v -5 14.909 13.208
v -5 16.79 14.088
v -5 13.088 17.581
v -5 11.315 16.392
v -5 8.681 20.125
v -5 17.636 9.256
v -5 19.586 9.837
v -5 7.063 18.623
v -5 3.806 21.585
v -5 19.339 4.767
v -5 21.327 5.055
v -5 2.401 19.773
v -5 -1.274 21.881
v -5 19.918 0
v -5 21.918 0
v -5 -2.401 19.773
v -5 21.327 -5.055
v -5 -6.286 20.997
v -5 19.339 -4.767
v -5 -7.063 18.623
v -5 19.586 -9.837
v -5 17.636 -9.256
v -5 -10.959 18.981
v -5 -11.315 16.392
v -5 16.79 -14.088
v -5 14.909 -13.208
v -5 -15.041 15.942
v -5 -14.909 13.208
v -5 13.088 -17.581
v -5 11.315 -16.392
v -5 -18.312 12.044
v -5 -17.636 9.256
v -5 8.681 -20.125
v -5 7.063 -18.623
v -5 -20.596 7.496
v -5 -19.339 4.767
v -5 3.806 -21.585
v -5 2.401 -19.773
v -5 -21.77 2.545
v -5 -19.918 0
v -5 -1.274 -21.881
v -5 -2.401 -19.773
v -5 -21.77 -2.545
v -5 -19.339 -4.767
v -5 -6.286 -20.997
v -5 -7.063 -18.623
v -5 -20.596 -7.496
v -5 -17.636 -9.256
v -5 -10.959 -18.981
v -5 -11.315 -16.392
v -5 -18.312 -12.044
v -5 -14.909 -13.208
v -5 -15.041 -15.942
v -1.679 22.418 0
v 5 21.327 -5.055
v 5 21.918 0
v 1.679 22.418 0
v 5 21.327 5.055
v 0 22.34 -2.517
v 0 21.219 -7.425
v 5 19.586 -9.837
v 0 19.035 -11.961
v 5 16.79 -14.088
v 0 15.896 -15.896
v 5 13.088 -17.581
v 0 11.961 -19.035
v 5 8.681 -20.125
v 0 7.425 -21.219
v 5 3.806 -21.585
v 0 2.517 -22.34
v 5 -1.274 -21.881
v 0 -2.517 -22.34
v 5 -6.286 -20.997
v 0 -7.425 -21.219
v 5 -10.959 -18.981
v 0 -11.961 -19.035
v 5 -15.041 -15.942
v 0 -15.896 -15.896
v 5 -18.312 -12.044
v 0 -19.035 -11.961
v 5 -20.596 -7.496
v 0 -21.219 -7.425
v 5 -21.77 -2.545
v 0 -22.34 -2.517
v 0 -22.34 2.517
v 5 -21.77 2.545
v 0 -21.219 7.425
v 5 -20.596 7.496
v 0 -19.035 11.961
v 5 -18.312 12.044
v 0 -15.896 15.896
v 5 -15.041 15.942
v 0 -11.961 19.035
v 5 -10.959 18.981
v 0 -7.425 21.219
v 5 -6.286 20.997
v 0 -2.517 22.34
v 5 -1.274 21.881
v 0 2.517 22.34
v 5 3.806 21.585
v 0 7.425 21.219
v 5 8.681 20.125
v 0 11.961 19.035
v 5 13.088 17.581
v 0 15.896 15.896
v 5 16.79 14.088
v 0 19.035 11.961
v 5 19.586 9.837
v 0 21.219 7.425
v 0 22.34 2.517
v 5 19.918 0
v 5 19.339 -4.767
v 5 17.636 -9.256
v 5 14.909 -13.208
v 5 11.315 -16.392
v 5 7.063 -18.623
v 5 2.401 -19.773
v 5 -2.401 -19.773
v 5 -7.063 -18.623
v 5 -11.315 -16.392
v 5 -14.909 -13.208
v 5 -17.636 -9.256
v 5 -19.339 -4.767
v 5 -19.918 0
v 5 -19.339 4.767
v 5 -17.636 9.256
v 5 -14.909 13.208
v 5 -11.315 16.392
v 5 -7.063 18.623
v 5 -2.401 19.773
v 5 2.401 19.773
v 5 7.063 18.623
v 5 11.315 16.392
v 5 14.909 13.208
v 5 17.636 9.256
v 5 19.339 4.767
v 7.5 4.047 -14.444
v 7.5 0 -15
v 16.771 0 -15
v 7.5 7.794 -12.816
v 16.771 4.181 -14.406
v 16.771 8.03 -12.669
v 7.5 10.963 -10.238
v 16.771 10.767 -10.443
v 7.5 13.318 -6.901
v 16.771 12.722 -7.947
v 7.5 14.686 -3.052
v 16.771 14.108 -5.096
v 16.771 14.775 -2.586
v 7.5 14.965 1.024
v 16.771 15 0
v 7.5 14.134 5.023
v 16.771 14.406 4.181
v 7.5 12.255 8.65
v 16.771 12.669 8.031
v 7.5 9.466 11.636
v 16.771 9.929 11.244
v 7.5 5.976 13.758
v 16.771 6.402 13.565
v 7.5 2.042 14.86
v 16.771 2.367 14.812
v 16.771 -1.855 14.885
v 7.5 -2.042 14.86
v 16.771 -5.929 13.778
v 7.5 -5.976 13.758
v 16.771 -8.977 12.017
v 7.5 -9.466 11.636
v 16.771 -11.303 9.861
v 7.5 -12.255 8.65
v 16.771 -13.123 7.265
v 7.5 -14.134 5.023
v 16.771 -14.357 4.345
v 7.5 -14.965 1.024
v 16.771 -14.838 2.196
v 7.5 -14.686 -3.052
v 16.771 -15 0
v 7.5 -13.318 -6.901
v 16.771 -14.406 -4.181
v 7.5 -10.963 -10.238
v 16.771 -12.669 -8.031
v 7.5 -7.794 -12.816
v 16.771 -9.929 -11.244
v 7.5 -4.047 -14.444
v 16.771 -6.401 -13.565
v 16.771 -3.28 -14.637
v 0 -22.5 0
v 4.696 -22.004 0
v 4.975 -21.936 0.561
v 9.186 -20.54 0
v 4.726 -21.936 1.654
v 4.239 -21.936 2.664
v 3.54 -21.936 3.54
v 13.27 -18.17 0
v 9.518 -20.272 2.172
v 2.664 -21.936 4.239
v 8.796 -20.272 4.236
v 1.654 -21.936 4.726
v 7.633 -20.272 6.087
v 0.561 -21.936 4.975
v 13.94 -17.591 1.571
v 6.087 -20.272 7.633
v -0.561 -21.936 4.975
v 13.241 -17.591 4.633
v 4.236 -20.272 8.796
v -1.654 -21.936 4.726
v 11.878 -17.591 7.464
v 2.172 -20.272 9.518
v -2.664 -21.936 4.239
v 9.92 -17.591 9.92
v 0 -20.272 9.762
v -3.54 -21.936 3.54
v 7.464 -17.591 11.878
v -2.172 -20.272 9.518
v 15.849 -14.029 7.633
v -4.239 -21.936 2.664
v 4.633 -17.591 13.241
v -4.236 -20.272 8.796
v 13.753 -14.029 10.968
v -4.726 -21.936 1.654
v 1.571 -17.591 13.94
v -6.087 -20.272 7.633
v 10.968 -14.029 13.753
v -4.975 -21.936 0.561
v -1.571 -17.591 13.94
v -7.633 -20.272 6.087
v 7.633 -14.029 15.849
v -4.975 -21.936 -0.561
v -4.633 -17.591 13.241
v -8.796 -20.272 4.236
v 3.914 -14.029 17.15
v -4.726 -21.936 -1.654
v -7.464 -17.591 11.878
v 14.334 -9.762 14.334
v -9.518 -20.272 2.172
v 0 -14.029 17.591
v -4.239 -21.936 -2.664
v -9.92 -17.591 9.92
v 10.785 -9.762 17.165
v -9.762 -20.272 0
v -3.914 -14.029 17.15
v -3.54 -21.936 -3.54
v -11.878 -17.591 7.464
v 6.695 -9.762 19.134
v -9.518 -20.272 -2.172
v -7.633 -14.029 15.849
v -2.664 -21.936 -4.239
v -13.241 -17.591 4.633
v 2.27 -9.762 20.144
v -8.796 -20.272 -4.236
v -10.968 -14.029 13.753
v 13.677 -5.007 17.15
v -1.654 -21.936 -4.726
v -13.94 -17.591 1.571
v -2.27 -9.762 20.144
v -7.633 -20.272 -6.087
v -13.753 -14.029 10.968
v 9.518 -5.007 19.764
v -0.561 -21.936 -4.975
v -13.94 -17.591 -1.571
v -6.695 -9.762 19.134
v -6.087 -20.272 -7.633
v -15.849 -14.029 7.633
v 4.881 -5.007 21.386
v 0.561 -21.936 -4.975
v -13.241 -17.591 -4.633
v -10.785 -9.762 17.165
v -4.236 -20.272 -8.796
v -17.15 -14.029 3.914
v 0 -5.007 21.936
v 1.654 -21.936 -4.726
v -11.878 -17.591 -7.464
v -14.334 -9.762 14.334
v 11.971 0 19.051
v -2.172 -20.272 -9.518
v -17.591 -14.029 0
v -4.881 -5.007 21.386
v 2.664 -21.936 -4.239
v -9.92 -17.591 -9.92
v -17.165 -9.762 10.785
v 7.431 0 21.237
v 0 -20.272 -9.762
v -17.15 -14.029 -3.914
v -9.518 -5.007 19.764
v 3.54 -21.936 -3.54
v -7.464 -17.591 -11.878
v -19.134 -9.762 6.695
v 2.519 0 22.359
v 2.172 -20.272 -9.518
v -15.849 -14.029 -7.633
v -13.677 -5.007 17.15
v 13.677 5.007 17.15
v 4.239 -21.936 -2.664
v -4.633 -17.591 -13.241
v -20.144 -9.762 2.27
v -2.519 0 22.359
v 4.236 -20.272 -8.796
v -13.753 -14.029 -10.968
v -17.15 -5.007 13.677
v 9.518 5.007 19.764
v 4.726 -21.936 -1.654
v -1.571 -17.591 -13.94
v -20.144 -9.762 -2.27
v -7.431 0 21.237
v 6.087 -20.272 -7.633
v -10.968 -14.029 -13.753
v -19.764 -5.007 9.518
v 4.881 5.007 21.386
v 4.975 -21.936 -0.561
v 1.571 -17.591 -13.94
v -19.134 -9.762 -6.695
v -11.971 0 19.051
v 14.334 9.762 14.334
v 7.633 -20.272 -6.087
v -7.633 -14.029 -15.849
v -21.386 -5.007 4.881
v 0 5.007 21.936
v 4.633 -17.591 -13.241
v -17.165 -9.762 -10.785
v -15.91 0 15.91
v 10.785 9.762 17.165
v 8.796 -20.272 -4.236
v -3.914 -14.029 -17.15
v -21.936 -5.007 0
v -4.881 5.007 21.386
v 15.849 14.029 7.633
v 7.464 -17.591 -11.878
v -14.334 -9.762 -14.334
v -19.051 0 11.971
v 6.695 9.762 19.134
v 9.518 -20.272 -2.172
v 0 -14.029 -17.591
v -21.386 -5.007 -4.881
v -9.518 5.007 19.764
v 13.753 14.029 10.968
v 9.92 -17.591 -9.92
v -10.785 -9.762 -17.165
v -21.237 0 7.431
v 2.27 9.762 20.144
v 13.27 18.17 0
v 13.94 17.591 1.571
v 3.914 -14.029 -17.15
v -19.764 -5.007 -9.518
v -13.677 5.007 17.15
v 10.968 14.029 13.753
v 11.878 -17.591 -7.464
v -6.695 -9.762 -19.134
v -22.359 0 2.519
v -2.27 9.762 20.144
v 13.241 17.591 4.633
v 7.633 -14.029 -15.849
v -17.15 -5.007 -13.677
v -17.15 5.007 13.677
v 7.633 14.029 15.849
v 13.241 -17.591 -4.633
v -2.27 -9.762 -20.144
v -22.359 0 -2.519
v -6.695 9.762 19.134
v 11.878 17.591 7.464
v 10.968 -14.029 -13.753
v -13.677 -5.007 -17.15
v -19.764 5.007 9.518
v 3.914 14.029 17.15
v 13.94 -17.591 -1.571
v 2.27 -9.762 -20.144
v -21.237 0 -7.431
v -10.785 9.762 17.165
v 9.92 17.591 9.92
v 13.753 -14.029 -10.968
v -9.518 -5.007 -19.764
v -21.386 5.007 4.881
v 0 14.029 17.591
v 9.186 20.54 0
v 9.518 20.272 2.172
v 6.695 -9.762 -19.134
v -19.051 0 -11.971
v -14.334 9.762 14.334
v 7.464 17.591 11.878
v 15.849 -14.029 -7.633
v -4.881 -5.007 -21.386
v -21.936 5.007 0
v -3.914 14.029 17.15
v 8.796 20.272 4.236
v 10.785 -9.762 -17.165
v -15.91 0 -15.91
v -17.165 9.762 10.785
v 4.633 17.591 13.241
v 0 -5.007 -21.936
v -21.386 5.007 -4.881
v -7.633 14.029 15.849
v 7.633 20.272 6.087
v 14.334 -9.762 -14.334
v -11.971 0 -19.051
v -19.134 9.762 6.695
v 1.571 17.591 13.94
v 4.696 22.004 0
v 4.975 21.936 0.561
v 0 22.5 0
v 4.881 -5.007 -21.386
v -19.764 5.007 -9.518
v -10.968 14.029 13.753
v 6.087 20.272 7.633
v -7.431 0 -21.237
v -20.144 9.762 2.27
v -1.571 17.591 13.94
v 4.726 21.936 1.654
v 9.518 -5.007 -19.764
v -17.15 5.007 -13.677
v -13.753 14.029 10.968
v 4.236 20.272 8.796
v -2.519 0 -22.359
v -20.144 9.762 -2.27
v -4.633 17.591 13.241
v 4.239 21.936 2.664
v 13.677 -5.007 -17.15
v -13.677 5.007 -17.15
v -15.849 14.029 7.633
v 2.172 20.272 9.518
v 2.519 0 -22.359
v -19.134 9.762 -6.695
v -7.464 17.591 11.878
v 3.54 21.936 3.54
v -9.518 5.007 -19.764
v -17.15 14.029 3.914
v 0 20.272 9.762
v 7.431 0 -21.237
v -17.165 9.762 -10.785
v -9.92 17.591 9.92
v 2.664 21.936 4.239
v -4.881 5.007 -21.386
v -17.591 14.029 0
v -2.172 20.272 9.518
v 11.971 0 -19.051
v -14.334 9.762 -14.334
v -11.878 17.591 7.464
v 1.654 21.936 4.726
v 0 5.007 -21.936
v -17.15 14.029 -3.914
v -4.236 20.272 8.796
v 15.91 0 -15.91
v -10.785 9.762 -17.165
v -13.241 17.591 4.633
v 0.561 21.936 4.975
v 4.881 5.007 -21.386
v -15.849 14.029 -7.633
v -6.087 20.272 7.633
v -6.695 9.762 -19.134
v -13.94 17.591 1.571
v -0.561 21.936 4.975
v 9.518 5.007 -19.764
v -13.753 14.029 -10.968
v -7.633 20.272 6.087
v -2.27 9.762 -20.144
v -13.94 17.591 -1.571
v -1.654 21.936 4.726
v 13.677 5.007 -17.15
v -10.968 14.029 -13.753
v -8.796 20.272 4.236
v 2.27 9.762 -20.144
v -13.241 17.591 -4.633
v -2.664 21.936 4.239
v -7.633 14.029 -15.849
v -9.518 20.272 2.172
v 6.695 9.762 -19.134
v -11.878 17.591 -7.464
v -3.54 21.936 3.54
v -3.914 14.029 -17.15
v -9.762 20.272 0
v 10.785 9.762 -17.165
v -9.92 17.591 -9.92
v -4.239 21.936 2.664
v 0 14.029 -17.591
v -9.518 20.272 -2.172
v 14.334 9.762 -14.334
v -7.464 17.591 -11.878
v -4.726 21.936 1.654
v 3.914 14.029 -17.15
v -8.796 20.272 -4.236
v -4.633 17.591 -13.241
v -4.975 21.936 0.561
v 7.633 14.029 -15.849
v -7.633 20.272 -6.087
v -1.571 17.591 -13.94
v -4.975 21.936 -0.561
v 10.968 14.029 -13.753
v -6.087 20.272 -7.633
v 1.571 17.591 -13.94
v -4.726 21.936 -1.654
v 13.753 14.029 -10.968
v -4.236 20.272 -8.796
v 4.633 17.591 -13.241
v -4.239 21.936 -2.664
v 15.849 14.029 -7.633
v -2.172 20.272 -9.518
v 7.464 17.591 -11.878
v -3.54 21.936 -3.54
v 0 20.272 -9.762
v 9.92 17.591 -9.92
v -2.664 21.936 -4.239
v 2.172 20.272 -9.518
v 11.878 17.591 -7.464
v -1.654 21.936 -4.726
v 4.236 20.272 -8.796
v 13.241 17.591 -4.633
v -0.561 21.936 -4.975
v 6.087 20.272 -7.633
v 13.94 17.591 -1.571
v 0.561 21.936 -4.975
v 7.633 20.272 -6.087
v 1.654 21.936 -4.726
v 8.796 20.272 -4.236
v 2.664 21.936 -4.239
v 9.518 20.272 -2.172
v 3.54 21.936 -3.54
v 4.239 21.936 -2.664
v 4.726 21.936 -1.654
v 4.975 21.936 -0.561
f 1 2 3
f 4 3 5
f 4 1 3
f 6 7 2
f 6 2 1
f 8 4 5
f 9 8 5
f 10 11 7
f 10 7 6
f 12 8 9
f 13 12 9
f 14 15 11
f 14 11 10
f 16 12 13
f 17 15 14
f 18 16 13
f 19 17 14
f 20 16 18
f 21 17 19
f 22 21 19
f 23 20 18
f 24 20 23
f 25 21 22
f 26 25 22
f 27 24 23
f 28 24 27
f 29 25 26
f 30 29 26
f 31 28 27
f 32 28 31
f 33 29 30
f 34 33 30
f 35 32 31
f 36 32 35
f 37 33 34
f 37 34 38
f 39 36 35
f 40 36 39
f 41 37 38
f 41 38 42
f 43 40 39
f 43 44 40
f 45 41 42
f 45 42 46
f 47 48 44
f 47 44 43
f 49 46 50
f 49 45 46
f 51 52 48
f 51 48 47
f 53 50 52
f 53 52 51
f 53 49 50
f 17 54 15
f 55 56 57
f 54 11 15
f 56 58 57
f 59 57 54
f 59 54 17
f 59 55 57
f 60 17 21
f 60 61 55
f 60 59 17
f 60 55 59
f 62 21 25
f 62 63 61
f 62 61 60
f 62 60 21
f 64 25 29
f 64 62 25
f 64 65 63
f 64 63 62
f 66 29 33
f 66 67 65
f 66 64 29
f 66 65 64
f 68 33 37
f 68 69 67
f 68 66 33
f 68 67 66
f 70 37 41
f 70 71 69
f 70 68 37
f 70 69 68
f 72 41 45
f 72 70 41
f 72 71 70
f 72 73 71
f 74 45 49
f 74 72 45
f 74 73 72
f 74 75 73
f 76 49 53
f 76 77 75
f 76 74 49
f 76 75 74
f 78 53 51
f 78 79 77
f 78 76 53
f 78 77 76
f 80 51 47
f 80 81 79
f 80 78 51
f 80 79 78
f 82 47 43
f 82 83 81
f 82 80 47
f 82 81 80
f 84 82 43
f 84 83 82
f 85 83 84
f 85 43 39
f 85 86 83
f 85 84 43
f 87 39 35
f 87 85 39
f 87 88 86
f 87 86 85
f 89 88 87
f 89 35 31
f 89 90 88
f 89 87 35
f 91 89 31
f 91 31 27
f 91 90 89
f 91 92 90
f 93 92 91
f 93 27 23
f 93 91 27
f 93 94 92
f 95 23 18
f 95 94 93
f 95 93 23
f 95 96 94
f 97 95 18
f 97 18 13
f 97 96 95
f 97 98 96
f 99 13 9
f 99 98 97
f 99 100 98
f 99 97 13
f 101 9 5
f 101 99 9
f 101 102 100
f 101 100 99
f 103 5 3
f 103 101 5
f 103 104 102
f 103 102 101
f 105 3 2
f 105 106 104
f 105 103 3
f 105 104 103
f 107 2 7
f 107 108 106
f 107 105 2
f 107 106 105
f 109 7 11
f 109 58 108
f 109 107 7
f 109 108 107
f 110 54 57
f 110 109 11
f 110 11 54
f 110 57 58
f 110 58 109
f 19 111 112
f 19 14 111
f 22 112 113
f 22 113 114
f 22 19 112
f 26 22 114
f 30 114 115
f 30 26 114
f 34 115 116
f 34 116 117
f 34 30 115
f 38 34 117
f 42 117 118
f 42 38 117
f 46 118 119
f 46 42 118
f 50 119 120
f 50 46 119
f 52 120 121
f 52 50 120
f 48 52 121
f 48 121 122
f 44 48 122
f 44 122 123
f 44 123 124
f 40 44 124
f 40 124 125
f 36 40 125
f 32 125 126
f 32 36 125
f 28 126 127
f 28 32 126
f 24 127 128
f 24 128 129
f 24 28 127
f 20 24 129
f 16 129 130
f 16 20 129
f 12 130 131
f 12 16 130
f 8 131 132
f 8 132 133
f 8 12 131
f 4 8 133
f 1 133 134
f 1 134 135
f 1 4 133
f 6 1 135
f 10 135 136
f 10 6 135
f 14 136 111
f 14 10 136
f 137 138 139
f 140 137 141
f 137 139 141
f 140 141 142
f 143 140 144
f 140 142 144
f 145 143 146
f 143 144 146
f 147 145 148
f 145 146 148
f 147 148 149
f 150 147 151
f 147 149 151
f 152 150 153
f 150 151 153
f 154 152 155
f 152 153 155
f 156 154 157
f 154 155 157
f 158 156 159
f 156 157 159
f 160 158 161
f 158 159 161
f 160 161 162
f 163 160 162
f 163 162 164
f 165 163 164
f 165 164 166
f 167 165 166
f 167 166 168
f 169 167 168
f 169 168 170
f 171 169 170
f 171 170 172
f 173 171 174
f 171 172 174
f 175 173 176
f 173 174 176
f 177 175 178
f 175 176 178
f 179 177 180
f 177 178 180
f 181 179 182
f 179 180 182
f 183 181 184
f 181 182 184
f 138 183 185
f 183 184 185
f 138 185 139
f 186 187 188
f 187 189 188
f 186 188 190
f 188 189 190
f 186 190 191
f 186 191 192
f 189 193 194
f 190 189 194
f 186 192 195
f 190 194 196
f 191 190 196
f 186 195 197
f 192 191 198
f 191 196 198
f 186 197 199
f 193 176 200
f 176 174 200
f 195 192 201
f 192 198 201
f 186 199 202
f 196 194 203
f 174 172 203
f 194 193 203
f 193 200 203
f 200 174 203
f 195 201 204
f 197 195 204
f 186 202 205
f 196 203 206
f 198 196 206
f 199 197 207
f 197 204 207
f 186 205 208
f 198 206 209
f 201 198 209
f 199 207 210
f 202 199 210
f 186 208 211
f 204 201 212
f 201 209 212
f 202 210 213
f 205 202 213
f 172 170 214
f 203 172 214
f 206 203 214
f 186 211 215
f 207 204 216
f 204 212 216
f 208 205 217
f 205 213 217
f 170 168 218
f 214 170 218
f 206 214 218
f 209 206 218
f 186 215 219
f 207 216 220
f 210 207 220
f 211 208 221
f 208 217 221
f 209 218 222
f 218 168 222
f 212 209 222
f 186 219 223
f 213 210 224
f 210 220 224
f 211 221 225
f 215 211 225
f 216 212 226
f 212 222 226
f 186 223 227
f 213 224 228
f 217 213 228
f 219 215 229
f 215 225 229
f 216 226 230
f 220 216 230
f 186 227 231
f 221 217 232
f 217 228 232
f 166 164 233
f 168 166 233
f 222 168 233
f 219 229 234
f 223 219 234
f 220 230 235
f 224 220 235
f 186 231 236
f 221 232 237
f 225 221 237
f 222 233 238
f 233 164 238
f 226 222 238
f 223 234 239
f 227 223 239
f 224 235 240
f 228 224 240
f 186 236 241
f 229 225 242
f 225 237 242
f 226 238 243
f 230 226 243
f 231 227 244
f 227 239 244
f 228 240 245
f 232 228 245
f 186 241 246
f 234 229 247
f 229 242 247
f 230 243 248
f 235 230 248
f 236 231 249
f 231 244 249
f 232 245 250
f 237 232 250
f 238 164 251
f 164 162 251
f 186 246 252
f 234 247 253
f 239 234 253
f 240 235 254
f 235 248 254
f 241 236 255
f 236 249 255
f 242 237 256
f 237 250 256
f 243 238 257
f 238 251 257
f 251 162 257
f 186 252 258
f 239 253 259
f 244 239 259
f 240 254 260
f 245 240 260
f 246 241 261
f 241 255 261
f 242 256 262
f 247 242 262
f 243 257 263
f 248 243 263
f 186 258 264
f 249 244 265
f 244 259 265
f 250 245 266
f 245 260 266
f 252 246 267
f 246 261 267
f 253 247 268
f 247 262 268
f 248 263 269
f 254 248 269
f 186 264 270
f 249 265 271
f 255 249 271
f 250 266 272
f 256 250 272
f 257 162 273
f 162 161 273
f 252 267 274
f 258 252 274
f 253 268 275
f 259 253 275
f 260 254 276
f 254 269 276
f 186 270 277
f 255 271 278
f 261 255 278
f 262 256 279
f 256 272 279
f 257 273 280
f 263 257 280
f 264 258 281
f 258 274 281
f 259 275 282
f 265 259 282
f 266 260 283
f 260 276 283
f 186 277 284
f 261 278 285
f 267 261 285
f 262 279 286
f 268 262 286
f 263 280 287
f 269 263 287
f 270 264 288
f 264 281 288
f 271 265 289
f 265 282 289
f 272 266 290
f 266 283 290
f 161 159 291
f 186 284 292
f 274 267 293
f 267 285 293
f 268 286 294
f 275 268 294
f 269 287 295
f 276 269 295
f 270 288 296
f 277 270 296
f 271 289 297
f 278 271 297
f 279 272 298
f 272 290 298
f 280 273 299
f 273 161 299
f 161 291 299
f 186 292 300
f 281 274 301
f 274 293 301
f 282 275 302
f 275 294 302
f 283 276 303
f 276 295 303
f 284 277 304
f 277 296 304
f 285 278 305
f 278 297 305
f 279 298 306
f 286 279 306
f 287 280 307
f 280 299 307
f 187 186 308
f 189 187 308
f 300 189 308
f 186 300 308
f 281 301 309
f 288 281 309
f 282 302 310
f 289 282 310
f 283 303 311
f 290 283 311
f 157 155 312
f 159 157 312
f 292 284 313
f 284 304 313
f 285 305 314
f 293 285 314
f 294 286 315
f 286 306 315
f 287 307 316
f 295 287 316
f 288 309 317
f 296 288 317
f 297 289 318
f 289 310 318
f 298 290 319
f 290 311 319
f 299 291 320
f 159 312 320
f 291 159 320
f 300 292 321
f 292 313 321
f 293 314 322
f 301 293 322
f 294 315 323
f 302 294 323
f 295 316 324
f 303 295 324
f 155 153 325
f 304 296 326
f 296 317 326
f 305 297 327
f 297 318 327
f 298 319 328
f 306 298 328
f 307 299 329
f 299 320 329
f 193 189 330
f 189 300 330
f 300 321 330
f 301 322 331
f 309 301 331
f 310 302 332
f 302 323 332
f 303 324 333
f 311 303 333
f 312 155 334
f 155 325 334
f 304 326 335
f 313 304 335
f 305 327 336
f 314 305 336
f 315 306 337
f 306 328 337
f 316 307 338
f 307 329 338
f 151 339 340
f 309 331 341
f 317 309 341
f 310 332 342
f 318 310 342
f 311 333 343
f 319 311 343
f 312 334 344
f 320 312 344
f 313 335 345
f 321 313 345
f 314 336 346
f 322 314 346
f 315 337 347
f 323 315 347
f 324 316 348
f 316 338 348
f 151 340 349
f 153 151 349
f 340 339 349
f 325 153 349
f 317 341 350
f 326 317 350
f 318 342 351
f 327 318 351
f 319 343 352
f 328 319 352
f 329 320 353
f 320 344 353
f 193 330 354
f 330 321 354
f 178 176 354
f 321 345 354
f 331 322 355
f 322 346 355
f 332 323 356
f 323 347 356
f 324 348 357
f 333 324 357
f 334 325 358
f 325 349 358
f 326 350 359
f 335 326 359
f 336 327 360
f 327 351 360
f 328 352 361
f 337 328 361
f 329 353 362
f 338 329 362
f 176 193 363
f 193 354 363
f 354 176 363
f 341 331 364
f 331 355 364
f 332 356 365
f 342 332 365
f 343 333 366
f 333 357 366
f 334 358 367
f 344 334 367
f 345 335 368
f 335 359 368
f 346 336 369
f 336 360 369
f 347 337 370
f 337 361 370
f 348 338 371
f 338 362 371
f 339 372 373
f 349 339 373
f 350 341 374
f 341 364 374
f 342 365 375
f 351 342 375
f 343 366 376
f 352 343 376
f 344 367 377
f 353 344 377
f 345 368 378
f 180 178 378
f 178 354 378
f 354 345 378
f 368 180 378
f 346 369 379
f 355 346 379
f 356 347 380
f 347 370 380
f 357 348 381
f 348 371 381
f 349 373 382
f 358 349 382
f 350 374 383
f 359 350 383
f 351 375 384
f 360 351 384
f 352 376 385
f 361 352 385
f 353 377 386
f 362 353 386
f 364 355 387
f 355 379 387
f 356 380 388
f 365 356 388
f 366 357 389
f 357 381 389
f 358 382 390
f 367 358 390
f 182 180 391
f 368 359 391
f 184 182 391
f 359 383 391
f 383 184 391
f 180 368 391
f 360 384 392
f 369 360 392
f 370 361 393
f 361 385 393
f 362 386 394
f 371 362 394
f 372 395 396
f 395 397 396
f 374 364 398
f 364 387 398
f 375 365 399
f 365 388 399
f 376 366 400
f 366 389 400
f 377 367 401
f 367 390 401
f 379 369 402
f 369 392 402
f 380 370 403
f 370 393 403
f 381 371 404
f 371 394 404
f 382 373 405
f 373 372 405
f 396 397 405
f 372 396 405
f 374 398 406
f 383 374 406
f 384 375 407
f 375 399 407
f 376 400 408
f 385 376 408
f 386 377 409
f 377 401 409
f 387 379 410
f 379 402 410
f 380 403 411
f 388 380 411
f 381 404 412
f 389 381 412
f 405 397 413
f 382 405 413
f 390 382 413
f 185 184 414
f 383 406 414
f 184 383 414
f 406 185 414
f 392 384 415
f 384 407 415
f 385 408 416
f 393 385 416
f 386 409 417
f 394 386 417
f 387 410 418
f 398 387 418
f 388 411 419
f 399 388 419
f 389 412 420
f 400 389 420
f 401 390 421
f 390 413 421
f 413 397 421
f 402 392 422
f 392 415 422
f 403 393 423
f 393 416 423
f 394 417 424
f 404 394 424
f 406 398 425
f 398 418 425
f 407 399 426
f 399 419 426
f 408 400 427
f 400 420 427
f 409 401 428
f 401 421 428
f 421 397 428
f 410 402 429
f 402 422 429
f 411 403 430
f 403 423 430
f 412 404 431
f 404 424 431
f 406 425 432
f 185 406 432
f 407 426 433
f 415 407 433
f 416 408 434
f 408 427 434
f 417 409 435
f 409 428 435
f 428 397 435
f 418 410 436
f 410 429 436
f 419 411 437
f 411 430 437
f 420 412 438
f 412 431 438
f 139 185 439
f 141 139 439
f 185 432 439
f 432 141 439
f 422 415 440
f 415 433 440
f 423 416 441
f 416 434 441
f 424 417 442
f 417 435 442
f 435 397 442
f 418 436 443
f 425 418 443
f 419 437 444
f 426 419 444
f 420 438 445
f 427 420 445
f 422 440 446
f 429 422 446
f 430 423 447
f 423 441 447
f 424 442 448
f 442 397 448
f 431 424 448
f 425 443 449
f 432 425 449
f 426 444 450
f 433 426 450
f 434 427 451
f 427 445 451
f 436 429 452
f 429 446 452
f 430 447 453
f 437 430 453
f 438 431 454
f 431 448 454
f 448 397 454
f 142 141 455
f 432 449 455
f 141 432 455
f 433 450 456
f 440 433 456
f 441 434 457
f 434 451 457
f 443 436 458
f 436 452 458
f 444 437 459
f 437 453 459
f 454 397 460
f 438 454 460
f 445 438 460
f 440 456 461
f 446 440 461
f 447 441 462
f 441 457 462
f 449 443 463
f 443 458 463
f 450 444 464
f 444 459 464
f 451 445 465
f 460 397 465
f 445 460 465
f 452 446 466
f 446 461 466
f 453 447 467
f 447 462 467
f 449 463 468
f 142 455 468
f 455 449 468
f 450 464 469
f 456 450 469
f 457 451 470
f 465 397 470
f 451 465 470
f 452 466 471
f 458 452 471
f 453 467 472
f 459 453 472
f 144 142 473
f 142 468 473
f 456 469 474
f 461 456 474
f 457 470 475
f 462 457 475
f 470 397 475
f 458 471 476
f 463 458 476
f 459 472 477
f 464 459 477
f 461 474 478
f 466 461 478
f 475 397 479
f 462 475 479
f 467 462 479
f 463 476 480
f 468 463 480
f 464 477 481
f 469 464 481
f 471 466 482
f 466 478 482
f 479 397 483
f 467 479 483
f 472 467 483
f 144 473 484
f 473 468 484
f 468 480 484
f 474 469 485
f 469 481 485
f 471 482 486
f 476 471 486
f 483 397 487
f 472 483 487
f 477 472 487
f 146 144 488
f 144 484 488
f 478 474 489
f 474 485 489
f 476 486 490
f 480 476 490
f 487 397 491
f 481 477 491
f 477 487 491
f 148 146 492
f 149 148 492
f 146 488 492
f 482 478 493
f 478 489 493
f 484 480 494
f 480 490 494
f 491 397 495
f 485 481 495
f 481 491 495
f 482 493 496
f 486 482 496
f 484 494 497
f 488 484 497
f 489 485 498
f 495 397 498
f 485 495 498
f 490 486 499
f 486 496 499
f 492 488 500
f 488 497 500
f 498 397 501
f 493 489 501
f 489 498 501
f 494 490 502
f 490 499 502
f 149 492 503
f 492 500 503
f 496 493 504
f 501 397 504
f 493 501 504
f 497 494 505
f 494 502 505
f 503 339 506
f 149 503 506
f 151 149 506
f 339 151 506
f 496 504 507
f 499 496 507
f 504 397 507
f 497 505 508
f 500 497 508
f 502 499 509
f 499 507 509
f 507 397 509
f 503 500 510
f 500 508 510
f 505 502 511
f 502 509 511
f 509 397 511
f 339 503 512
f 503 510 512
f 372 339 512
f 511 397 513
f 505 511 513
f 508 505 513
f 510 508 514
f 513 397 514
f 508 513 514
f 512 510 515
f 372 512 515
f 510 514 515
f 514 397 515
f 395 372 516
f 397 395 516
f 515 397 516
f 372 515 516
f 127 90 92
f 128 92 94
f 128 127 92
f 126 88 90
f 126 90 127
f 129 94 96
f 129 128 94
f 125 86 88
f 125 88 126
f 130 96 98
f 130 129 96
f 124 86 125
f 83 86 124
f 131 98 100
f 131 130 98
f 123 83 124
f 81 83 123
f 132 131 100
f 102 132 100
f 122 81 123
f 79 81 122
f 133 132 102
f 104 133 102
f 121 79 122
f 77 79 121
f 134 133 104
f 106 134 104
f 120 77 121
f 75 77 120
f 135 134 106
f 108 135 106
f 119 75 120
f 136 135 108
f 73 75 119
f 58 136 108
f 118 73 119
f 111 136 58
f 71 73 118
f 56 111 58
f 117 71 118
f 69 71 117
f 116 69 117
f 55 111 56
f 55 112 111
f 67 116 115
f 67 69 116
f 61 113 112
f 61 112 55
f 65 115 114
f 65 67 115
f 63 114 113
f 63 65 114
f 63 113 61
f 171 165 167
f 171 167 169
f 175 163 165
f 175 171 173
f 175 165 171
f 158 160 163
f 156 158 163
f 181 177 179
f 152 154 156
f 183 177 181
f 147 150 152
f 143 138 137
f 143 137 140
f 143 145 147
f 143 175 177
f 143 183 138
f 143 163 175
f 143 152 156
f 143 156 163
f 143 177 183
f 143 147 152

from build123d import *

# Parameters (mm, degrees)
SKETCH4_R          = 15
CUT_EXTRUDE1_DEPTH = 15


with BuildPart() as part:
    # Sketch1 → Revolve1 (revolve)
    with BuildSketch(Plane.XY):
        with BuildLine():
            Line((0, 22.5), (0, -22.5))
            ThreePointArc((0, -22.5), (22.5, 0), (0, 22.5))
        make_face()
    revolve(axis=Axis((0, 22.5, 0), (0, -1, 0)))

    # Sketch2 → Cut-Revolve6 (revolve, cut)
    with BuildSketch(Plane.XY):
        with BuildLine():
            Line((5, 19.917809385), (-5, 19.917809385))
            Line((-5, 19.917809385), (-5, 21.917809385))
            ThreePointArc((-5, 21.917809385), (0, 22.480888956), (5, 21.917809385))
            Line((5, 21.917809385), (5, 19.917809385))
        make_face()
    revolve(axis=Axis((0, 0, 0), (-1, 0, 0)), mode=Mode.SUBTRACT)

    # Sketch4 → Cut-Extrude1 (cut)
    with BuildSketch(Plane(origin=(22.5, 0, 0), x_dir=(0, 0, -1), z_dir=(1, 0, 0))):
        Circle(SKETCH4_R)
    extrude(amount=-CUT_EXTRUDE1_DEPTH, mode=Mode.SUBTRACT)


solid = part.part
